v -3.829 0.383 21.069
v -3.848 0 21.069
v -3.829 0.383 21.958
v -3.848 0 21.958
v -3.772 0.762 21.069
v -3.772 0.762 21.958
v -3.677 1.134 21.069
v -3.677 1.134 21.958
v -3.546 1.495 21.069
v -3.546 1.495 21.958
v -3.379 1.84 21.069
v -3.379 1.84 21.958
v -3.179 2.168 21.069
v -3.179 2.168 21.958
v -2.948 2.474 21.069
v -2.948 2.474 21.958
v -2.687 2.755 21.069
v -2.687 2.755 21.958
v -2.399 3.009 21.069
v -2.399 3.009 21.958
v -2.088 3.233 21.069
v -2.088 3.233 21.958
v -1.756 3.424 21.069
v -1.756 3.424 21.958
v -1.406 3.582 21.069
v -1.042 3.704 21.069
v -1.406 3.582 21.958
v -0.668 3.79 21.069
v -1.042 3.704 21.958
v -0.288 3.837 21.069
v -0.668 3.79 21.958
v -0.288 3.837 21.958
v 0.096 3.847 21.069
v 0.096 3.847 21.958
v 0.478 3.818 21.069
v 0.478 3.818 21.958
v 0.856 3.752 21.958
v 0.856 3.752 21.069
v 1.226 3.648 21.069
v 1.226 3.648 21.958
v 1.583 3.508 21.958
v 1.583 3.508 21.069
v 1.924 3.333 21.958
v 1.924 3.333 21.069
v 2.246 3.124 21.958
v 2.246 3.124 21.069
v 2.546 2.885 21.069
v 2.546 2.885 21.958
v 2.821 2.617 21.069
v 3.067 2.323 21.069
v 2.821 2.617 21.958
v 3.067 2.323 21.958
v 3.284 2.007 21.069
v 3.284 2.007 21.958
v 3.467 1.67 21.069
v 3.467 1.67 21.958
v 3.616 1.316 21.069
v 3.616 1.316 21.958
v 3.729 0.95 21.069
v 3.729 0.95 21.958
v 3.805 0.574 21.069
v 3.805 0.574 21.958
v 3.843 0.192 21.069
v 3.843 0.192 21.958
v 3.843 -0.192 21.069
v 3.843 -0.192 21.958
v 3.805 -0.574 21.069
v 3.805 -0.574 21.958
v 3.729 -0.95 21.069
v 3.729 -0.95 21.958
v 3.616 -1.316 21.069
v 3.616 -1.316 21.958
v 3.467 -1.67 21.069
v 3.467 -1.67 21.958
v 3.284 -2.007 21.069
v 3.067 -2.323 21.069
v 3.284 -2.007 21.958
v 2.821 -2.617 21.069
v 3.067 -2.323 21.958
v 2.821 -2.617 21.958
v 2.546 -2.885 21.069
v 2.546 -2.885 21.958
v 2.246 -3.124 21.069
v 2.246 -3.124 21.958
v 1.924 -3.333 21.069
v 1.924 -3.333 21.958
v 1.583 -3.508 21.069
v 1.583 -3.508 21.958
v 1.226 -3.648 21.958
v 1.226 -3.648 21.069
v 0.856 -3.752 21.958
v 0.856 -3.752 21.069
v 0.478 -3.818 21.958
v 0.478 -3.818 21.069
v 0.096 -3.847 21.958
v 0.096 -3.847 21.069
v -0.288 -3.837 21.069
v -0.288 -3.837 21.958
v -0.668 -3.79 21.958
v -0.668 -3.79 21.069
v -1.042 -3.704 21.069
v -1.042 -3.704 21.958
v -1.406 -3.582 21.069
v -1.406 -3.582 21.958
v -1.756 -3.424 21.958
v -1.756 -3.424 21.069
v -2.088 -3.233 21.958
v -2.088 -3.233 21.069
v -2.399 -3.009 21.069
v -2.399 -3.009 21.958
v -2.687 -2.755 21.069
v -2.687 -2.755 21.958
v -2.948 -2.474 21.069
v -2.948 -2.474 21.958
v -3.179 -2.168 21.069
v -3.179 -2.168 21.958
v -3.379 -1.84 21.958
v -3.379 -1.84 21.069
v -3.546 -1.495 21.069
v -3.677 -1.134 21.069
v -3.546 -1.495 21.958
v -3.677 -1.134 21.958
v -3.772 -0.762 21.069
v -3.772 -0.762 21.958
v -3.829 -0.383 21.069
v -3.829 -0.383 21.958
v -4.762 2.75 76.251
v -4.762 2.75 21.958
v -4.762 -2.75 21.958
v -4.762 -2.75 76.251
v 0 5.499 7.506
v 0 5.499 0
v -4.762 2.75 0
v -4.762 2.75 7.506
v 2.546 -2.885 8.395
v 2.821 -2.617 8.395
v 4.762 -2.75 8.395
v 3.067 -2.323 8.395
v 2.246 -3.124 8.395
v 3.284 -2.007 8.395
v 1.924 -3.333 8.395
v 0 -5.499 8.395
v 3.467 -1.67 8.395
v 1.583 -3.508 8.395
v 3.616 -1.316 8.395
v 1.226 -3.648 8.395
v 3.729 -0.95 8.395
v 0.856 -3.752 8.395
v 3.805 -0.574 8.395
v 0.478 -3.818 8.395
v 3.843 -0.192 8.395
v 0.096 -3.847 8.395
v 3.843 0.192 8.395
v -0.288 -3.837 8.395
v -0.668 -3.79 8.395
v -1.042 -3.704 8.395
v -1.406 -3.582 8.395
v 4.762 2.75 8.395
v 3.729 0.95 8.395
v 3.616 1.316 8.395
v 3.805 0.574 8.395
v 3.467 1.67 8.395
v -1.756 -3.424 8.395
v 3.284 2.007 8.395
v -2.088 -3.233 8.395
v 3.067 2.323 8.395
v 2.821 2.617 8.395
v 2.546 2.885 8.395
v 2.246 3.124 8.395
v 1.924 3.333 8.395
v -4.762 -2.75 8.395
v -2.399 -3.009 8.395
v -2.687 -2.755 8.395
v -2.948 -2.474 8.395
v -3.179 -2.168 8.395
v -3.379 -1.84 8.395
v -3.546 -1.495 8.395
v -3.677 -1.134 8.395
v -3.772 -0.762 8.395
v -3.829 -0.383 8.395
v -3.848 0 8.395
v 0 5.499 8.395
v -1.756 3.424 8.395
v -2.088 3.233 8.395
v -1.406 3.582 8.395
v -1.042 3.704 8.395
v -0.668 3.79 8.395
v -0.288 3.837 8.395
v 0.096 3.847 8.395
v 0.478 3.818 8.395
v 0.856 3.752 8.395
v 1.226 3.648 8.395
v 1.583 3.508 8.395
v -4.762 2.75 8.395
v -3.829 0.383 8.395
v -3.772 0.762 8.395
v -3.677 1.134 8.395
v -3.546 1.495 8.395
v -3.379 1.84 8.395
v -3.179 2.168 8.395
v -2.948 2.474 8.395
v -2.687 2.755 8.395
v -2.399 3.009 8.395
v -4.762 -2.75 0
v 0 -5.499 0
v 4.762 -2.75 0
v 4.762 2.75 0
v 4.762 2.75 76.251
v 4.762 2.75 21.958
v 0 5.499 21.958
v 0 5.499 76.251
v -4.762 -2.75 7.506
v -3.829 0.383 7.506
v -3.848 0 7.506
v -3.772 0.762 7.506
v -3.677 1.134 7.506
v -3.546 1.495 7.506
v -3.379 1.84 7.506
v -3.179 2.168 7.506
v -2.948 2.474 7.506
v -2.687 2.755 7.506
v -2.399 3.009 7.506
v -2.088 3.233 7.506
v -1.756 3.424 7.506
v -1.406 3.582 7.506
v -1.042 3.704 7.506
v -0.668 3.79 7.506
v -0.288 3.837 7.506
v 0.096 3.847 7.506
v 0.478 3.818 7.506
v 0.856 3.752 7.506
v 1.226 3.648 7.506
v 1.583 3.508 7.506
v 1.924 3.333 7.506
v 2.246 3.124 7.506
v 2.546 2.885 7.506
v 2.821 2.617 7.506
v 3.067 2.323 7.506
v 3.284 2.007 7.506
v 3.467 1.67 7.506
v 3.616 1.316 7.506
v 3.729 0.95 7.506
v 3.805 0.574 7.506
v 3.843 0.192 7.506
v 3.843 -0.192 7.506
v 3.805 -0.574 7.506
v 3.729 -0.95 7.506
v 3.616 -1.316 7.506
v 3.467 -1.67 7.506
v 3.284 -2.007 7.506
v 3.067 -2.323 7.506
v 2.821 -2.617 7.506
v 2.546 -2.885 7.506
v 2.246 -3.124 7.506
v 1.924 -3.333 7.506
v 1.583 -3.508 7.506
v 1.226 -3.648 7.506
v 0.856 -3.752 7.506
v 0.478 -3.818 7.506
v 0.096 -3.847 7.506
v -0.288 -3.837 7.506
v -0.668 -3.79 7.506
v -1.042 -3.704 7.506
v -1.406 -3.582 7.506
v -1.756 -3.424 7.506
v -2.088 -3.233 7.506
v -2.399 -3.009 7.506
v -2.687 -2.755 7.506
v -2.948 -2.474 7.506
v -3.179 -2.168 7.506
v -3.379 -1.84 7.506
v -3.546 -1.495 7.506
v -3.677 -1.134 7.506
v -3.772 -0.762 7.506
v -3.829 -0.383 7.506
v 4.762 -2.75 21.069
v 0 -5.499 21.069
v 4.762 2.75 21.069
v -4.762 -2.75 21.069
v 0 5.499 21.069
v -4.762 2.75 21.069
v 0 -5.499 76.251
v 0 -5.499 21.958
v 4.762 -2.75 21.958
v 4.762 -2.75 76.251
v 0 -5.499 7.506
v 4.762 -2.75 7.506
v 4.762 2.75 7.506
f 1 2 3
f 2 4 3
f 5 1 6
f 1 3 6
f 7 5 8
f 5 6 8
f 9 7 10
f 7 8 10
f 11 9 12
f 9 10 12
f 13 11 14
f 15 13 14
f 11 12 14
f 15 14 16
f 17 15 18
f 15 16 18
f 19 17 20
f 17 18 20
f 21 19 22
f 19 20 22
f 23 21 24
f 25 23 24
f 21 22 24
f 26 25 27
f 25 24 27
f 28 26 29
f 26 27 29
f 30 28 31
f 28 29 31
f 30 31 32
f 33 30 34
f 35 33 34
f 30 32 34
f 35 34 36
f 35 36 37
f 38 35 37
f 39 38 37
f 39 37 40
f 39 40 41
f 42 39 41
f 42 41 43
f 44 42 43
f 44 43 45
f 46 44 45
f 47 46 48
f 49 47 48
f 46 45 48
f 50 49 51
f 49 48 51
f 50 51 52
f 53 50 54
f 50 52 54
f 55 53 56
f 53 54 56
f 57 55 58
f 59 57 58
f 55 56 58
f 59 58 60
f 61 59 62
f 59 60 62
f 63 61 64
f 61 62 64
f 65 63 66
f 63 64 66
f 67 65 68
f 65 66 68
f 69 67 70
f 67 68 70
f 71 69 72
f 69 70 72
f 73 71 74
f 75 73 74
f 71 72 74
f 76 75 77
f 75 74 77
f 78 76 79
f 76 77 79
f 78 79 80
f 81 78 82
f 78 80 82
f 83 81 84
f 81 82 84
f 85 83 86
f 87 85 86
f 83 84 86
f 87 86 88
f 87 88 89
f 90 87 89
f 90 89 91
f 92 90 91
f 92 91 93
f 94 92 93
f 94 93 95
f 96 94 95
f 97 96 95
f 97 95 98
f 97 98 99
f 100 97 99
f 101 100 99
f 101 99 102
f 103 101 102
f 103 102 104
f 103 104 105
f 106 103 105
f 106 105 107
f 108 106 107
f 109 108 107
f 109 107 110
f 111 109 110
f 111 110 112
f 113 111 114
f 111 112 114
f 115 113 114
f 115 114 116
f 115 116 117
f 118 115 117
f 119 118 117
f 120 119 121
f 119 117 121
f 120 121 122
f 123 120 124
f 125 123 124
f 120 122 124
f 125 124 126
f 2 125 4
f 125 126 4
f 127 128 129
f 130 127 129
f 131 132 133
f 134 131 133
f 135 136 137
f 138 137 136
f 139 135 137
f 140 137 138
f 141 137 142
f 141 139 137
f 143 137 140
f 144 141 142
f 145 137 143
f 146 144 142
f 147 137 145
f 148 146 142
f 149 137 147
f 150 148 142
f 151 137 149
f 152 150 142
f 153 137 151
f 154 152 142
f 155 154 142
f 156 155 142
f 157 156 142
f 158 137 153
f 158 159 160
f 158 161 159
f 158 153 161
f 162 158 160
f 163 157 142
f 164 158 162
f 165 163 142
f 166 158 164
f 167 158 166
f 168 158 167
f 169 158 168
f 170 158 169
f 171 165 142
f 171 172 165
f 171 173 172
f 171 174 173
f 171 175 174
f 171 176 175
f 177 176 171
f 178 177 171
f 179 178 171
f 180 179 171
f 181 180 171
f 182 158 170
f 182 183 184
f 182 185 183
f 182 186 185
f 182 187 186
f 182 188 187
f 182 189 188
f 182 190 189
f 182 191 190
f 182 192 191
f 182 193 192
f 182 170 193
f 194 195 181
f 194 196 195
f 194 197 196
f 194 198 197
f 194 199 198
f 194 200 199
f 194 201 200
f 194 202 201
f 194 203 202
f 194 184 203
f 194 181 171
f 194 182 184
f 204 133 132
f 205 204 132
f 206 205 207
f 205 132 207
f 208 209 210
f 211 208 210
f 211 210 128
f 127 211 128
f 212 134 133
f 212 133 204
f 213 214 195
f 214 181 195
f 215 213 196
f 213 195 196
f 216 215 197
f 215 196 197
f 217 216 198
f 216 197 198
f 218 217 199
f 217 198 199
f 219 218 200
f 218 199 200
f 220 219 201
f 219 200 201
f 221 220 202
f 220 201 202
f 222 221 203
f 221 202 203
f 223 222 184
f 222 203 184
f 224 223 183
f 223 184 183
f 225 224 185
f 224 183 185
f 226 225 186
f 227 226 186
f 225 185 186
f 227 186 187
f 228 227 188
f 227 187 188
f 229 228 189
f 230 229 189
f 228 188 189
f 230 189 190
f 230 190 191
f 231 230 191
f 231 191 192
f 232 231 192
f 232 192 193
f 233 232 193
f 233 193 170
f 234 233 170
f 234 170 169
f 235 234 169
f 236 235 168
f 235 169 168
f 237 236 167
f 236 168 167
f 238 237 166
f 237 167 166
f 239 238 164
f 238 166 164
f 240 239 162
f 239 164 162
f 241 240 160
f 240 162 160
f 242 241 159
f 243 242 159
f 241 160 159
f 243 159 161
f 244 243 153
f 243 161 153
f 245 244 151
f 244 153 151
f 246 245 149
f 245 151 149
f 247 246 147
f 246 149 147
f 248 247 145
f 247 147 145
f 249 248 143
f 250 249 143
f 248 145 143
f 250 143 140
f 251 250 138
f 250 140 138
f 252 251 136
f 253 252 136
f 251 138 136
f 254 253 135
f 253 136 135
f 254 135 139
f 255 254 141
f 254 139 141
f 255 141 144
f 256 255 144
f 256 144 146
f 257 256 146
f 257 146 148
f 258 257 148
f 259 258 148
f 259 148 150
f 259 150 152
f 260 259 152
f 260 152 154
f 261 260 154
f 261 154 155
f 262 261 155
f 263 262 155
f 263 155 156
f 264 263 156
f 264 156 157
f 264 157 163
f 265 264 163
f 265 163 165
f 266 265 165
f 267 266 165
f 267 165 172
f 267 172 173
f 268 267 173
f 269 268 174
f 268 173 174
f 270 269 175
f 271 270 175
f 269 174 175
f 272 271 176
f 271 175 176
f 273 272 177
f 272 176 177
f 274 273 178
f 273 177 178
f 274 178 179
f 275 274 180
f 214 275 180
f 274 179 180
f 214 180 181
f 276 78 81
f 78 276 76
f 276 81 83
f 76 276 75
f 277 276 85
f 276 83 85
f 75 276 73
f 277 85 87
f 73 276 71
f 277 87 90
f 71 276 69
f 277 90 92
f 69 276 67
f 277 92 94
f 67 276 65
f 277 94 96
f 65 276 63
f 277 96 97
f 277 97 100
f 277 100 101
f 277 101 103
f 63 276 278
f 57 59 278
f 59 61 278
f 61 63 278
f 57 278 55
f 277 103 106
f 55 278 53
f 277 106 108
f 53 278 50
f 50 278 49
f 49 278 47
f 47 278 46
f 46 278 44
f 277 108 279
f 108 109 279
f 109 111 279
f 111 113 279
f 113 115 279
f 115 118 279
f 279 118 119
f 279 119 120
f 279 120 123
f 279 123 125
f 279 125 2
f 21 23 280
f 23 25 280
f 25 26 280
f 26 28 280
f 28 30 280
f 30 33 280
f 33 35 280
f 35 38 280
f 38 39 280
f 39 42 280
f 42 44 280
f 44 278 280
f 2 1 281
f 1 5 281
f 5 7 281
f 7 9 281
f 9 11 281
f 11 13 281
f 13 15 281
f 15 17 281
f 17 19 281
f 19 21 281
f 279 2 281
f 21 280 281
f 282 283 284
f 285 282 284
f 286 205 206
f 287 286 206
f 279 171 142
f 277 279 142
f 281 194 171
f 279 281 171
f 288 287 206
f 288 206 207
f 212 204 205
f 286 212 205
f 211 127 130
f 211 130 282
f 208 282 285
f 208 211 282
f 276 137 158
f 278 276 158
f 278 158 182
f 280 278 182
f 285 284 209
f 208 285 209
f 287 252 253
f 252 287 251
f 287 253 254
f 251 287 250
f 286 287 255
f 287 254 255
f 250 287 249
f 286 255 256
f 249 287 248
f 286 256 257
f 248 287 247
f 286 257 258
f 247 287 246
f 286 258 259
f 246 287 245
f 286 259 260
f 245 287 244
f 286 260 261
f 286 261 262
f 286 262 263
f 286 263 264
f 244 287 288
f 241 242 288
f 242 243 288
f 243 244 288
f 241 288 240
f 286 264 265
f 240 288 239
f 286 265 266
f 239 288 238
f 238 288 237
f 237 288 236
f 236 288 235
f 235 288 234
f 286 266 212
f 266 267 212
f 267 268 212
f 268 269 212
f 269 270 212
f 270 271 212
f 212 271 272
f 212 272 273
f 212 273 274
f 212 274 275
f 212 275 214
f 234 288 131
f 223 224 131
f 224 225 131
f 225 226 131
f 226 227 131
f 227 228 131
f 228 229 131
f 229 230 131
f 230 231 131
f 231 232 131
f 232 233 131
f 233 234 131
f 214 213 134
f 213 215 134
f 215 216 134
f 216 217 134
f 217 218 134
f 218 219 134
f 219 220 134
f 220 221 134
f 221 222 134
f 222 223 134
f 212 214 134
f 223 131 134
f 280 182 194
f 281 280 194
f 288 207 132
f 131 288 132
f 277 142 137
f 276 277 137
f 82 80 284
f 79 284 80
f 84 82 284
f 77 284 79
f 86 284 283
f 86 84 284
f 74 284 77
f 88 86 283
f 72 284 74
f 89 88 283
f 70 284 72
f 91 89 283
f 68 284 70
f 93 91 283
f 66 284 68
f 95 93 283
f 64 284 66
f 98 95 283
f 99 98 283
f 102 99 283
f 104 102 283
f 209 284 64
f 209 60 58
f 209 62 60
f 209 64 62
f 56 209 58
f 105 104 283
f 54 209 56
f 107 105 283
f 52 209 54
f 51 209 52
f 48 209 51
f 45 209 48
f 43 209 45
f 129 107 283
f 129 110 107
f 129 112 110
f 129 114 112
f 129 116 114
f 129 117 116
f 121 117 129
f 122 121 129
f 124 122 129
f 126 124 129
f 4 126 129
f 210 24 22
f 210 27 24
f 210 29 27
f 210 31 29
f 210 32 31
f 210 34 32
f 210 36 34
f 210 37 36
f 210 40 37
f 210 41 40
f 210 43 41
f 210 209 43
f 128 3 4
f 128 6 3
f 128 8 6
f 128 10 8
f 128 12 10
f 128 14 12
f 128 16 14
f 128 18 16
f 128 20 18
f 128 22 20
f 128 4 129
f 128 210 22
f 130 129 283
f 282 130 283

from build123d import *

# Parameters (mm, degrees)
BOSS_EXTRUDE1_DEPTH = 76.2508
SKETCH5_W           = 11.10345239
SKETCH5_H           = 12.145052052
SKETCH5_R           = 3.8481
CUT_EXTRUDE2_DEPTH  = 0.4445
SKETCH6_W           = 10.752068687
SKETCH6_H           = 11.509710708
SKETCH6_R           = 3.8481
CUT_EXTRUDE3_DEPTH  = 0.4445


with BuildPart() as part:
    # Sketch1 → Boss-Extrude1 (new body)
    with BuildSketch(Plane.XY):
        Polygon((0, 5.499261314), (-4.7625, 2.749630657), (-4.7625, -2.749630657), (0, -5.499261314), (4.7625, -2.749630657), (4.7625, 2.749630657), align=None)
    extrude(amount=BOSS_EXTRUDE1_DEPTH)

    # Sketch5 → Cut-Extrude2 (cut, symmetric)
    with BuildSketch(Plane(origin=(0, 0, 21.5138), x_dir=(-1, 0, 0), z_dir=(0, 0, -1))):
        with Locations((-0.378227241, -0.09440181)):
            Rectangle(SKETCH5_W, SKETCH5_H)
        Circle(SKETCH5_R, mode=Mode.SUBTRACT)
    extrude(amount=CUT_EXTRUDE2_DEPTH, both=True, mode=Mode.SUBTRACT)

    # Sketch6 → Cut-Extrude3 (cut, symmetric)
    with BuildSketch(Plane(origin=(0, 0, 7.9502), x_dir=(-1, 0, 0), z_dir=(0, 0, -1))):
        with Locations((-0.265980709, -0.185380495)):
            Rectangle(SKETCH6_W, SKETCH6_H)
        Circle(SKETCH6_R, mode=Mode.SUBTRACT)
    extrude(amount=CUT_EXTRUDE3_DEPTH, both=True, mode=Mode.SUBTRACT)


solid = part.part
